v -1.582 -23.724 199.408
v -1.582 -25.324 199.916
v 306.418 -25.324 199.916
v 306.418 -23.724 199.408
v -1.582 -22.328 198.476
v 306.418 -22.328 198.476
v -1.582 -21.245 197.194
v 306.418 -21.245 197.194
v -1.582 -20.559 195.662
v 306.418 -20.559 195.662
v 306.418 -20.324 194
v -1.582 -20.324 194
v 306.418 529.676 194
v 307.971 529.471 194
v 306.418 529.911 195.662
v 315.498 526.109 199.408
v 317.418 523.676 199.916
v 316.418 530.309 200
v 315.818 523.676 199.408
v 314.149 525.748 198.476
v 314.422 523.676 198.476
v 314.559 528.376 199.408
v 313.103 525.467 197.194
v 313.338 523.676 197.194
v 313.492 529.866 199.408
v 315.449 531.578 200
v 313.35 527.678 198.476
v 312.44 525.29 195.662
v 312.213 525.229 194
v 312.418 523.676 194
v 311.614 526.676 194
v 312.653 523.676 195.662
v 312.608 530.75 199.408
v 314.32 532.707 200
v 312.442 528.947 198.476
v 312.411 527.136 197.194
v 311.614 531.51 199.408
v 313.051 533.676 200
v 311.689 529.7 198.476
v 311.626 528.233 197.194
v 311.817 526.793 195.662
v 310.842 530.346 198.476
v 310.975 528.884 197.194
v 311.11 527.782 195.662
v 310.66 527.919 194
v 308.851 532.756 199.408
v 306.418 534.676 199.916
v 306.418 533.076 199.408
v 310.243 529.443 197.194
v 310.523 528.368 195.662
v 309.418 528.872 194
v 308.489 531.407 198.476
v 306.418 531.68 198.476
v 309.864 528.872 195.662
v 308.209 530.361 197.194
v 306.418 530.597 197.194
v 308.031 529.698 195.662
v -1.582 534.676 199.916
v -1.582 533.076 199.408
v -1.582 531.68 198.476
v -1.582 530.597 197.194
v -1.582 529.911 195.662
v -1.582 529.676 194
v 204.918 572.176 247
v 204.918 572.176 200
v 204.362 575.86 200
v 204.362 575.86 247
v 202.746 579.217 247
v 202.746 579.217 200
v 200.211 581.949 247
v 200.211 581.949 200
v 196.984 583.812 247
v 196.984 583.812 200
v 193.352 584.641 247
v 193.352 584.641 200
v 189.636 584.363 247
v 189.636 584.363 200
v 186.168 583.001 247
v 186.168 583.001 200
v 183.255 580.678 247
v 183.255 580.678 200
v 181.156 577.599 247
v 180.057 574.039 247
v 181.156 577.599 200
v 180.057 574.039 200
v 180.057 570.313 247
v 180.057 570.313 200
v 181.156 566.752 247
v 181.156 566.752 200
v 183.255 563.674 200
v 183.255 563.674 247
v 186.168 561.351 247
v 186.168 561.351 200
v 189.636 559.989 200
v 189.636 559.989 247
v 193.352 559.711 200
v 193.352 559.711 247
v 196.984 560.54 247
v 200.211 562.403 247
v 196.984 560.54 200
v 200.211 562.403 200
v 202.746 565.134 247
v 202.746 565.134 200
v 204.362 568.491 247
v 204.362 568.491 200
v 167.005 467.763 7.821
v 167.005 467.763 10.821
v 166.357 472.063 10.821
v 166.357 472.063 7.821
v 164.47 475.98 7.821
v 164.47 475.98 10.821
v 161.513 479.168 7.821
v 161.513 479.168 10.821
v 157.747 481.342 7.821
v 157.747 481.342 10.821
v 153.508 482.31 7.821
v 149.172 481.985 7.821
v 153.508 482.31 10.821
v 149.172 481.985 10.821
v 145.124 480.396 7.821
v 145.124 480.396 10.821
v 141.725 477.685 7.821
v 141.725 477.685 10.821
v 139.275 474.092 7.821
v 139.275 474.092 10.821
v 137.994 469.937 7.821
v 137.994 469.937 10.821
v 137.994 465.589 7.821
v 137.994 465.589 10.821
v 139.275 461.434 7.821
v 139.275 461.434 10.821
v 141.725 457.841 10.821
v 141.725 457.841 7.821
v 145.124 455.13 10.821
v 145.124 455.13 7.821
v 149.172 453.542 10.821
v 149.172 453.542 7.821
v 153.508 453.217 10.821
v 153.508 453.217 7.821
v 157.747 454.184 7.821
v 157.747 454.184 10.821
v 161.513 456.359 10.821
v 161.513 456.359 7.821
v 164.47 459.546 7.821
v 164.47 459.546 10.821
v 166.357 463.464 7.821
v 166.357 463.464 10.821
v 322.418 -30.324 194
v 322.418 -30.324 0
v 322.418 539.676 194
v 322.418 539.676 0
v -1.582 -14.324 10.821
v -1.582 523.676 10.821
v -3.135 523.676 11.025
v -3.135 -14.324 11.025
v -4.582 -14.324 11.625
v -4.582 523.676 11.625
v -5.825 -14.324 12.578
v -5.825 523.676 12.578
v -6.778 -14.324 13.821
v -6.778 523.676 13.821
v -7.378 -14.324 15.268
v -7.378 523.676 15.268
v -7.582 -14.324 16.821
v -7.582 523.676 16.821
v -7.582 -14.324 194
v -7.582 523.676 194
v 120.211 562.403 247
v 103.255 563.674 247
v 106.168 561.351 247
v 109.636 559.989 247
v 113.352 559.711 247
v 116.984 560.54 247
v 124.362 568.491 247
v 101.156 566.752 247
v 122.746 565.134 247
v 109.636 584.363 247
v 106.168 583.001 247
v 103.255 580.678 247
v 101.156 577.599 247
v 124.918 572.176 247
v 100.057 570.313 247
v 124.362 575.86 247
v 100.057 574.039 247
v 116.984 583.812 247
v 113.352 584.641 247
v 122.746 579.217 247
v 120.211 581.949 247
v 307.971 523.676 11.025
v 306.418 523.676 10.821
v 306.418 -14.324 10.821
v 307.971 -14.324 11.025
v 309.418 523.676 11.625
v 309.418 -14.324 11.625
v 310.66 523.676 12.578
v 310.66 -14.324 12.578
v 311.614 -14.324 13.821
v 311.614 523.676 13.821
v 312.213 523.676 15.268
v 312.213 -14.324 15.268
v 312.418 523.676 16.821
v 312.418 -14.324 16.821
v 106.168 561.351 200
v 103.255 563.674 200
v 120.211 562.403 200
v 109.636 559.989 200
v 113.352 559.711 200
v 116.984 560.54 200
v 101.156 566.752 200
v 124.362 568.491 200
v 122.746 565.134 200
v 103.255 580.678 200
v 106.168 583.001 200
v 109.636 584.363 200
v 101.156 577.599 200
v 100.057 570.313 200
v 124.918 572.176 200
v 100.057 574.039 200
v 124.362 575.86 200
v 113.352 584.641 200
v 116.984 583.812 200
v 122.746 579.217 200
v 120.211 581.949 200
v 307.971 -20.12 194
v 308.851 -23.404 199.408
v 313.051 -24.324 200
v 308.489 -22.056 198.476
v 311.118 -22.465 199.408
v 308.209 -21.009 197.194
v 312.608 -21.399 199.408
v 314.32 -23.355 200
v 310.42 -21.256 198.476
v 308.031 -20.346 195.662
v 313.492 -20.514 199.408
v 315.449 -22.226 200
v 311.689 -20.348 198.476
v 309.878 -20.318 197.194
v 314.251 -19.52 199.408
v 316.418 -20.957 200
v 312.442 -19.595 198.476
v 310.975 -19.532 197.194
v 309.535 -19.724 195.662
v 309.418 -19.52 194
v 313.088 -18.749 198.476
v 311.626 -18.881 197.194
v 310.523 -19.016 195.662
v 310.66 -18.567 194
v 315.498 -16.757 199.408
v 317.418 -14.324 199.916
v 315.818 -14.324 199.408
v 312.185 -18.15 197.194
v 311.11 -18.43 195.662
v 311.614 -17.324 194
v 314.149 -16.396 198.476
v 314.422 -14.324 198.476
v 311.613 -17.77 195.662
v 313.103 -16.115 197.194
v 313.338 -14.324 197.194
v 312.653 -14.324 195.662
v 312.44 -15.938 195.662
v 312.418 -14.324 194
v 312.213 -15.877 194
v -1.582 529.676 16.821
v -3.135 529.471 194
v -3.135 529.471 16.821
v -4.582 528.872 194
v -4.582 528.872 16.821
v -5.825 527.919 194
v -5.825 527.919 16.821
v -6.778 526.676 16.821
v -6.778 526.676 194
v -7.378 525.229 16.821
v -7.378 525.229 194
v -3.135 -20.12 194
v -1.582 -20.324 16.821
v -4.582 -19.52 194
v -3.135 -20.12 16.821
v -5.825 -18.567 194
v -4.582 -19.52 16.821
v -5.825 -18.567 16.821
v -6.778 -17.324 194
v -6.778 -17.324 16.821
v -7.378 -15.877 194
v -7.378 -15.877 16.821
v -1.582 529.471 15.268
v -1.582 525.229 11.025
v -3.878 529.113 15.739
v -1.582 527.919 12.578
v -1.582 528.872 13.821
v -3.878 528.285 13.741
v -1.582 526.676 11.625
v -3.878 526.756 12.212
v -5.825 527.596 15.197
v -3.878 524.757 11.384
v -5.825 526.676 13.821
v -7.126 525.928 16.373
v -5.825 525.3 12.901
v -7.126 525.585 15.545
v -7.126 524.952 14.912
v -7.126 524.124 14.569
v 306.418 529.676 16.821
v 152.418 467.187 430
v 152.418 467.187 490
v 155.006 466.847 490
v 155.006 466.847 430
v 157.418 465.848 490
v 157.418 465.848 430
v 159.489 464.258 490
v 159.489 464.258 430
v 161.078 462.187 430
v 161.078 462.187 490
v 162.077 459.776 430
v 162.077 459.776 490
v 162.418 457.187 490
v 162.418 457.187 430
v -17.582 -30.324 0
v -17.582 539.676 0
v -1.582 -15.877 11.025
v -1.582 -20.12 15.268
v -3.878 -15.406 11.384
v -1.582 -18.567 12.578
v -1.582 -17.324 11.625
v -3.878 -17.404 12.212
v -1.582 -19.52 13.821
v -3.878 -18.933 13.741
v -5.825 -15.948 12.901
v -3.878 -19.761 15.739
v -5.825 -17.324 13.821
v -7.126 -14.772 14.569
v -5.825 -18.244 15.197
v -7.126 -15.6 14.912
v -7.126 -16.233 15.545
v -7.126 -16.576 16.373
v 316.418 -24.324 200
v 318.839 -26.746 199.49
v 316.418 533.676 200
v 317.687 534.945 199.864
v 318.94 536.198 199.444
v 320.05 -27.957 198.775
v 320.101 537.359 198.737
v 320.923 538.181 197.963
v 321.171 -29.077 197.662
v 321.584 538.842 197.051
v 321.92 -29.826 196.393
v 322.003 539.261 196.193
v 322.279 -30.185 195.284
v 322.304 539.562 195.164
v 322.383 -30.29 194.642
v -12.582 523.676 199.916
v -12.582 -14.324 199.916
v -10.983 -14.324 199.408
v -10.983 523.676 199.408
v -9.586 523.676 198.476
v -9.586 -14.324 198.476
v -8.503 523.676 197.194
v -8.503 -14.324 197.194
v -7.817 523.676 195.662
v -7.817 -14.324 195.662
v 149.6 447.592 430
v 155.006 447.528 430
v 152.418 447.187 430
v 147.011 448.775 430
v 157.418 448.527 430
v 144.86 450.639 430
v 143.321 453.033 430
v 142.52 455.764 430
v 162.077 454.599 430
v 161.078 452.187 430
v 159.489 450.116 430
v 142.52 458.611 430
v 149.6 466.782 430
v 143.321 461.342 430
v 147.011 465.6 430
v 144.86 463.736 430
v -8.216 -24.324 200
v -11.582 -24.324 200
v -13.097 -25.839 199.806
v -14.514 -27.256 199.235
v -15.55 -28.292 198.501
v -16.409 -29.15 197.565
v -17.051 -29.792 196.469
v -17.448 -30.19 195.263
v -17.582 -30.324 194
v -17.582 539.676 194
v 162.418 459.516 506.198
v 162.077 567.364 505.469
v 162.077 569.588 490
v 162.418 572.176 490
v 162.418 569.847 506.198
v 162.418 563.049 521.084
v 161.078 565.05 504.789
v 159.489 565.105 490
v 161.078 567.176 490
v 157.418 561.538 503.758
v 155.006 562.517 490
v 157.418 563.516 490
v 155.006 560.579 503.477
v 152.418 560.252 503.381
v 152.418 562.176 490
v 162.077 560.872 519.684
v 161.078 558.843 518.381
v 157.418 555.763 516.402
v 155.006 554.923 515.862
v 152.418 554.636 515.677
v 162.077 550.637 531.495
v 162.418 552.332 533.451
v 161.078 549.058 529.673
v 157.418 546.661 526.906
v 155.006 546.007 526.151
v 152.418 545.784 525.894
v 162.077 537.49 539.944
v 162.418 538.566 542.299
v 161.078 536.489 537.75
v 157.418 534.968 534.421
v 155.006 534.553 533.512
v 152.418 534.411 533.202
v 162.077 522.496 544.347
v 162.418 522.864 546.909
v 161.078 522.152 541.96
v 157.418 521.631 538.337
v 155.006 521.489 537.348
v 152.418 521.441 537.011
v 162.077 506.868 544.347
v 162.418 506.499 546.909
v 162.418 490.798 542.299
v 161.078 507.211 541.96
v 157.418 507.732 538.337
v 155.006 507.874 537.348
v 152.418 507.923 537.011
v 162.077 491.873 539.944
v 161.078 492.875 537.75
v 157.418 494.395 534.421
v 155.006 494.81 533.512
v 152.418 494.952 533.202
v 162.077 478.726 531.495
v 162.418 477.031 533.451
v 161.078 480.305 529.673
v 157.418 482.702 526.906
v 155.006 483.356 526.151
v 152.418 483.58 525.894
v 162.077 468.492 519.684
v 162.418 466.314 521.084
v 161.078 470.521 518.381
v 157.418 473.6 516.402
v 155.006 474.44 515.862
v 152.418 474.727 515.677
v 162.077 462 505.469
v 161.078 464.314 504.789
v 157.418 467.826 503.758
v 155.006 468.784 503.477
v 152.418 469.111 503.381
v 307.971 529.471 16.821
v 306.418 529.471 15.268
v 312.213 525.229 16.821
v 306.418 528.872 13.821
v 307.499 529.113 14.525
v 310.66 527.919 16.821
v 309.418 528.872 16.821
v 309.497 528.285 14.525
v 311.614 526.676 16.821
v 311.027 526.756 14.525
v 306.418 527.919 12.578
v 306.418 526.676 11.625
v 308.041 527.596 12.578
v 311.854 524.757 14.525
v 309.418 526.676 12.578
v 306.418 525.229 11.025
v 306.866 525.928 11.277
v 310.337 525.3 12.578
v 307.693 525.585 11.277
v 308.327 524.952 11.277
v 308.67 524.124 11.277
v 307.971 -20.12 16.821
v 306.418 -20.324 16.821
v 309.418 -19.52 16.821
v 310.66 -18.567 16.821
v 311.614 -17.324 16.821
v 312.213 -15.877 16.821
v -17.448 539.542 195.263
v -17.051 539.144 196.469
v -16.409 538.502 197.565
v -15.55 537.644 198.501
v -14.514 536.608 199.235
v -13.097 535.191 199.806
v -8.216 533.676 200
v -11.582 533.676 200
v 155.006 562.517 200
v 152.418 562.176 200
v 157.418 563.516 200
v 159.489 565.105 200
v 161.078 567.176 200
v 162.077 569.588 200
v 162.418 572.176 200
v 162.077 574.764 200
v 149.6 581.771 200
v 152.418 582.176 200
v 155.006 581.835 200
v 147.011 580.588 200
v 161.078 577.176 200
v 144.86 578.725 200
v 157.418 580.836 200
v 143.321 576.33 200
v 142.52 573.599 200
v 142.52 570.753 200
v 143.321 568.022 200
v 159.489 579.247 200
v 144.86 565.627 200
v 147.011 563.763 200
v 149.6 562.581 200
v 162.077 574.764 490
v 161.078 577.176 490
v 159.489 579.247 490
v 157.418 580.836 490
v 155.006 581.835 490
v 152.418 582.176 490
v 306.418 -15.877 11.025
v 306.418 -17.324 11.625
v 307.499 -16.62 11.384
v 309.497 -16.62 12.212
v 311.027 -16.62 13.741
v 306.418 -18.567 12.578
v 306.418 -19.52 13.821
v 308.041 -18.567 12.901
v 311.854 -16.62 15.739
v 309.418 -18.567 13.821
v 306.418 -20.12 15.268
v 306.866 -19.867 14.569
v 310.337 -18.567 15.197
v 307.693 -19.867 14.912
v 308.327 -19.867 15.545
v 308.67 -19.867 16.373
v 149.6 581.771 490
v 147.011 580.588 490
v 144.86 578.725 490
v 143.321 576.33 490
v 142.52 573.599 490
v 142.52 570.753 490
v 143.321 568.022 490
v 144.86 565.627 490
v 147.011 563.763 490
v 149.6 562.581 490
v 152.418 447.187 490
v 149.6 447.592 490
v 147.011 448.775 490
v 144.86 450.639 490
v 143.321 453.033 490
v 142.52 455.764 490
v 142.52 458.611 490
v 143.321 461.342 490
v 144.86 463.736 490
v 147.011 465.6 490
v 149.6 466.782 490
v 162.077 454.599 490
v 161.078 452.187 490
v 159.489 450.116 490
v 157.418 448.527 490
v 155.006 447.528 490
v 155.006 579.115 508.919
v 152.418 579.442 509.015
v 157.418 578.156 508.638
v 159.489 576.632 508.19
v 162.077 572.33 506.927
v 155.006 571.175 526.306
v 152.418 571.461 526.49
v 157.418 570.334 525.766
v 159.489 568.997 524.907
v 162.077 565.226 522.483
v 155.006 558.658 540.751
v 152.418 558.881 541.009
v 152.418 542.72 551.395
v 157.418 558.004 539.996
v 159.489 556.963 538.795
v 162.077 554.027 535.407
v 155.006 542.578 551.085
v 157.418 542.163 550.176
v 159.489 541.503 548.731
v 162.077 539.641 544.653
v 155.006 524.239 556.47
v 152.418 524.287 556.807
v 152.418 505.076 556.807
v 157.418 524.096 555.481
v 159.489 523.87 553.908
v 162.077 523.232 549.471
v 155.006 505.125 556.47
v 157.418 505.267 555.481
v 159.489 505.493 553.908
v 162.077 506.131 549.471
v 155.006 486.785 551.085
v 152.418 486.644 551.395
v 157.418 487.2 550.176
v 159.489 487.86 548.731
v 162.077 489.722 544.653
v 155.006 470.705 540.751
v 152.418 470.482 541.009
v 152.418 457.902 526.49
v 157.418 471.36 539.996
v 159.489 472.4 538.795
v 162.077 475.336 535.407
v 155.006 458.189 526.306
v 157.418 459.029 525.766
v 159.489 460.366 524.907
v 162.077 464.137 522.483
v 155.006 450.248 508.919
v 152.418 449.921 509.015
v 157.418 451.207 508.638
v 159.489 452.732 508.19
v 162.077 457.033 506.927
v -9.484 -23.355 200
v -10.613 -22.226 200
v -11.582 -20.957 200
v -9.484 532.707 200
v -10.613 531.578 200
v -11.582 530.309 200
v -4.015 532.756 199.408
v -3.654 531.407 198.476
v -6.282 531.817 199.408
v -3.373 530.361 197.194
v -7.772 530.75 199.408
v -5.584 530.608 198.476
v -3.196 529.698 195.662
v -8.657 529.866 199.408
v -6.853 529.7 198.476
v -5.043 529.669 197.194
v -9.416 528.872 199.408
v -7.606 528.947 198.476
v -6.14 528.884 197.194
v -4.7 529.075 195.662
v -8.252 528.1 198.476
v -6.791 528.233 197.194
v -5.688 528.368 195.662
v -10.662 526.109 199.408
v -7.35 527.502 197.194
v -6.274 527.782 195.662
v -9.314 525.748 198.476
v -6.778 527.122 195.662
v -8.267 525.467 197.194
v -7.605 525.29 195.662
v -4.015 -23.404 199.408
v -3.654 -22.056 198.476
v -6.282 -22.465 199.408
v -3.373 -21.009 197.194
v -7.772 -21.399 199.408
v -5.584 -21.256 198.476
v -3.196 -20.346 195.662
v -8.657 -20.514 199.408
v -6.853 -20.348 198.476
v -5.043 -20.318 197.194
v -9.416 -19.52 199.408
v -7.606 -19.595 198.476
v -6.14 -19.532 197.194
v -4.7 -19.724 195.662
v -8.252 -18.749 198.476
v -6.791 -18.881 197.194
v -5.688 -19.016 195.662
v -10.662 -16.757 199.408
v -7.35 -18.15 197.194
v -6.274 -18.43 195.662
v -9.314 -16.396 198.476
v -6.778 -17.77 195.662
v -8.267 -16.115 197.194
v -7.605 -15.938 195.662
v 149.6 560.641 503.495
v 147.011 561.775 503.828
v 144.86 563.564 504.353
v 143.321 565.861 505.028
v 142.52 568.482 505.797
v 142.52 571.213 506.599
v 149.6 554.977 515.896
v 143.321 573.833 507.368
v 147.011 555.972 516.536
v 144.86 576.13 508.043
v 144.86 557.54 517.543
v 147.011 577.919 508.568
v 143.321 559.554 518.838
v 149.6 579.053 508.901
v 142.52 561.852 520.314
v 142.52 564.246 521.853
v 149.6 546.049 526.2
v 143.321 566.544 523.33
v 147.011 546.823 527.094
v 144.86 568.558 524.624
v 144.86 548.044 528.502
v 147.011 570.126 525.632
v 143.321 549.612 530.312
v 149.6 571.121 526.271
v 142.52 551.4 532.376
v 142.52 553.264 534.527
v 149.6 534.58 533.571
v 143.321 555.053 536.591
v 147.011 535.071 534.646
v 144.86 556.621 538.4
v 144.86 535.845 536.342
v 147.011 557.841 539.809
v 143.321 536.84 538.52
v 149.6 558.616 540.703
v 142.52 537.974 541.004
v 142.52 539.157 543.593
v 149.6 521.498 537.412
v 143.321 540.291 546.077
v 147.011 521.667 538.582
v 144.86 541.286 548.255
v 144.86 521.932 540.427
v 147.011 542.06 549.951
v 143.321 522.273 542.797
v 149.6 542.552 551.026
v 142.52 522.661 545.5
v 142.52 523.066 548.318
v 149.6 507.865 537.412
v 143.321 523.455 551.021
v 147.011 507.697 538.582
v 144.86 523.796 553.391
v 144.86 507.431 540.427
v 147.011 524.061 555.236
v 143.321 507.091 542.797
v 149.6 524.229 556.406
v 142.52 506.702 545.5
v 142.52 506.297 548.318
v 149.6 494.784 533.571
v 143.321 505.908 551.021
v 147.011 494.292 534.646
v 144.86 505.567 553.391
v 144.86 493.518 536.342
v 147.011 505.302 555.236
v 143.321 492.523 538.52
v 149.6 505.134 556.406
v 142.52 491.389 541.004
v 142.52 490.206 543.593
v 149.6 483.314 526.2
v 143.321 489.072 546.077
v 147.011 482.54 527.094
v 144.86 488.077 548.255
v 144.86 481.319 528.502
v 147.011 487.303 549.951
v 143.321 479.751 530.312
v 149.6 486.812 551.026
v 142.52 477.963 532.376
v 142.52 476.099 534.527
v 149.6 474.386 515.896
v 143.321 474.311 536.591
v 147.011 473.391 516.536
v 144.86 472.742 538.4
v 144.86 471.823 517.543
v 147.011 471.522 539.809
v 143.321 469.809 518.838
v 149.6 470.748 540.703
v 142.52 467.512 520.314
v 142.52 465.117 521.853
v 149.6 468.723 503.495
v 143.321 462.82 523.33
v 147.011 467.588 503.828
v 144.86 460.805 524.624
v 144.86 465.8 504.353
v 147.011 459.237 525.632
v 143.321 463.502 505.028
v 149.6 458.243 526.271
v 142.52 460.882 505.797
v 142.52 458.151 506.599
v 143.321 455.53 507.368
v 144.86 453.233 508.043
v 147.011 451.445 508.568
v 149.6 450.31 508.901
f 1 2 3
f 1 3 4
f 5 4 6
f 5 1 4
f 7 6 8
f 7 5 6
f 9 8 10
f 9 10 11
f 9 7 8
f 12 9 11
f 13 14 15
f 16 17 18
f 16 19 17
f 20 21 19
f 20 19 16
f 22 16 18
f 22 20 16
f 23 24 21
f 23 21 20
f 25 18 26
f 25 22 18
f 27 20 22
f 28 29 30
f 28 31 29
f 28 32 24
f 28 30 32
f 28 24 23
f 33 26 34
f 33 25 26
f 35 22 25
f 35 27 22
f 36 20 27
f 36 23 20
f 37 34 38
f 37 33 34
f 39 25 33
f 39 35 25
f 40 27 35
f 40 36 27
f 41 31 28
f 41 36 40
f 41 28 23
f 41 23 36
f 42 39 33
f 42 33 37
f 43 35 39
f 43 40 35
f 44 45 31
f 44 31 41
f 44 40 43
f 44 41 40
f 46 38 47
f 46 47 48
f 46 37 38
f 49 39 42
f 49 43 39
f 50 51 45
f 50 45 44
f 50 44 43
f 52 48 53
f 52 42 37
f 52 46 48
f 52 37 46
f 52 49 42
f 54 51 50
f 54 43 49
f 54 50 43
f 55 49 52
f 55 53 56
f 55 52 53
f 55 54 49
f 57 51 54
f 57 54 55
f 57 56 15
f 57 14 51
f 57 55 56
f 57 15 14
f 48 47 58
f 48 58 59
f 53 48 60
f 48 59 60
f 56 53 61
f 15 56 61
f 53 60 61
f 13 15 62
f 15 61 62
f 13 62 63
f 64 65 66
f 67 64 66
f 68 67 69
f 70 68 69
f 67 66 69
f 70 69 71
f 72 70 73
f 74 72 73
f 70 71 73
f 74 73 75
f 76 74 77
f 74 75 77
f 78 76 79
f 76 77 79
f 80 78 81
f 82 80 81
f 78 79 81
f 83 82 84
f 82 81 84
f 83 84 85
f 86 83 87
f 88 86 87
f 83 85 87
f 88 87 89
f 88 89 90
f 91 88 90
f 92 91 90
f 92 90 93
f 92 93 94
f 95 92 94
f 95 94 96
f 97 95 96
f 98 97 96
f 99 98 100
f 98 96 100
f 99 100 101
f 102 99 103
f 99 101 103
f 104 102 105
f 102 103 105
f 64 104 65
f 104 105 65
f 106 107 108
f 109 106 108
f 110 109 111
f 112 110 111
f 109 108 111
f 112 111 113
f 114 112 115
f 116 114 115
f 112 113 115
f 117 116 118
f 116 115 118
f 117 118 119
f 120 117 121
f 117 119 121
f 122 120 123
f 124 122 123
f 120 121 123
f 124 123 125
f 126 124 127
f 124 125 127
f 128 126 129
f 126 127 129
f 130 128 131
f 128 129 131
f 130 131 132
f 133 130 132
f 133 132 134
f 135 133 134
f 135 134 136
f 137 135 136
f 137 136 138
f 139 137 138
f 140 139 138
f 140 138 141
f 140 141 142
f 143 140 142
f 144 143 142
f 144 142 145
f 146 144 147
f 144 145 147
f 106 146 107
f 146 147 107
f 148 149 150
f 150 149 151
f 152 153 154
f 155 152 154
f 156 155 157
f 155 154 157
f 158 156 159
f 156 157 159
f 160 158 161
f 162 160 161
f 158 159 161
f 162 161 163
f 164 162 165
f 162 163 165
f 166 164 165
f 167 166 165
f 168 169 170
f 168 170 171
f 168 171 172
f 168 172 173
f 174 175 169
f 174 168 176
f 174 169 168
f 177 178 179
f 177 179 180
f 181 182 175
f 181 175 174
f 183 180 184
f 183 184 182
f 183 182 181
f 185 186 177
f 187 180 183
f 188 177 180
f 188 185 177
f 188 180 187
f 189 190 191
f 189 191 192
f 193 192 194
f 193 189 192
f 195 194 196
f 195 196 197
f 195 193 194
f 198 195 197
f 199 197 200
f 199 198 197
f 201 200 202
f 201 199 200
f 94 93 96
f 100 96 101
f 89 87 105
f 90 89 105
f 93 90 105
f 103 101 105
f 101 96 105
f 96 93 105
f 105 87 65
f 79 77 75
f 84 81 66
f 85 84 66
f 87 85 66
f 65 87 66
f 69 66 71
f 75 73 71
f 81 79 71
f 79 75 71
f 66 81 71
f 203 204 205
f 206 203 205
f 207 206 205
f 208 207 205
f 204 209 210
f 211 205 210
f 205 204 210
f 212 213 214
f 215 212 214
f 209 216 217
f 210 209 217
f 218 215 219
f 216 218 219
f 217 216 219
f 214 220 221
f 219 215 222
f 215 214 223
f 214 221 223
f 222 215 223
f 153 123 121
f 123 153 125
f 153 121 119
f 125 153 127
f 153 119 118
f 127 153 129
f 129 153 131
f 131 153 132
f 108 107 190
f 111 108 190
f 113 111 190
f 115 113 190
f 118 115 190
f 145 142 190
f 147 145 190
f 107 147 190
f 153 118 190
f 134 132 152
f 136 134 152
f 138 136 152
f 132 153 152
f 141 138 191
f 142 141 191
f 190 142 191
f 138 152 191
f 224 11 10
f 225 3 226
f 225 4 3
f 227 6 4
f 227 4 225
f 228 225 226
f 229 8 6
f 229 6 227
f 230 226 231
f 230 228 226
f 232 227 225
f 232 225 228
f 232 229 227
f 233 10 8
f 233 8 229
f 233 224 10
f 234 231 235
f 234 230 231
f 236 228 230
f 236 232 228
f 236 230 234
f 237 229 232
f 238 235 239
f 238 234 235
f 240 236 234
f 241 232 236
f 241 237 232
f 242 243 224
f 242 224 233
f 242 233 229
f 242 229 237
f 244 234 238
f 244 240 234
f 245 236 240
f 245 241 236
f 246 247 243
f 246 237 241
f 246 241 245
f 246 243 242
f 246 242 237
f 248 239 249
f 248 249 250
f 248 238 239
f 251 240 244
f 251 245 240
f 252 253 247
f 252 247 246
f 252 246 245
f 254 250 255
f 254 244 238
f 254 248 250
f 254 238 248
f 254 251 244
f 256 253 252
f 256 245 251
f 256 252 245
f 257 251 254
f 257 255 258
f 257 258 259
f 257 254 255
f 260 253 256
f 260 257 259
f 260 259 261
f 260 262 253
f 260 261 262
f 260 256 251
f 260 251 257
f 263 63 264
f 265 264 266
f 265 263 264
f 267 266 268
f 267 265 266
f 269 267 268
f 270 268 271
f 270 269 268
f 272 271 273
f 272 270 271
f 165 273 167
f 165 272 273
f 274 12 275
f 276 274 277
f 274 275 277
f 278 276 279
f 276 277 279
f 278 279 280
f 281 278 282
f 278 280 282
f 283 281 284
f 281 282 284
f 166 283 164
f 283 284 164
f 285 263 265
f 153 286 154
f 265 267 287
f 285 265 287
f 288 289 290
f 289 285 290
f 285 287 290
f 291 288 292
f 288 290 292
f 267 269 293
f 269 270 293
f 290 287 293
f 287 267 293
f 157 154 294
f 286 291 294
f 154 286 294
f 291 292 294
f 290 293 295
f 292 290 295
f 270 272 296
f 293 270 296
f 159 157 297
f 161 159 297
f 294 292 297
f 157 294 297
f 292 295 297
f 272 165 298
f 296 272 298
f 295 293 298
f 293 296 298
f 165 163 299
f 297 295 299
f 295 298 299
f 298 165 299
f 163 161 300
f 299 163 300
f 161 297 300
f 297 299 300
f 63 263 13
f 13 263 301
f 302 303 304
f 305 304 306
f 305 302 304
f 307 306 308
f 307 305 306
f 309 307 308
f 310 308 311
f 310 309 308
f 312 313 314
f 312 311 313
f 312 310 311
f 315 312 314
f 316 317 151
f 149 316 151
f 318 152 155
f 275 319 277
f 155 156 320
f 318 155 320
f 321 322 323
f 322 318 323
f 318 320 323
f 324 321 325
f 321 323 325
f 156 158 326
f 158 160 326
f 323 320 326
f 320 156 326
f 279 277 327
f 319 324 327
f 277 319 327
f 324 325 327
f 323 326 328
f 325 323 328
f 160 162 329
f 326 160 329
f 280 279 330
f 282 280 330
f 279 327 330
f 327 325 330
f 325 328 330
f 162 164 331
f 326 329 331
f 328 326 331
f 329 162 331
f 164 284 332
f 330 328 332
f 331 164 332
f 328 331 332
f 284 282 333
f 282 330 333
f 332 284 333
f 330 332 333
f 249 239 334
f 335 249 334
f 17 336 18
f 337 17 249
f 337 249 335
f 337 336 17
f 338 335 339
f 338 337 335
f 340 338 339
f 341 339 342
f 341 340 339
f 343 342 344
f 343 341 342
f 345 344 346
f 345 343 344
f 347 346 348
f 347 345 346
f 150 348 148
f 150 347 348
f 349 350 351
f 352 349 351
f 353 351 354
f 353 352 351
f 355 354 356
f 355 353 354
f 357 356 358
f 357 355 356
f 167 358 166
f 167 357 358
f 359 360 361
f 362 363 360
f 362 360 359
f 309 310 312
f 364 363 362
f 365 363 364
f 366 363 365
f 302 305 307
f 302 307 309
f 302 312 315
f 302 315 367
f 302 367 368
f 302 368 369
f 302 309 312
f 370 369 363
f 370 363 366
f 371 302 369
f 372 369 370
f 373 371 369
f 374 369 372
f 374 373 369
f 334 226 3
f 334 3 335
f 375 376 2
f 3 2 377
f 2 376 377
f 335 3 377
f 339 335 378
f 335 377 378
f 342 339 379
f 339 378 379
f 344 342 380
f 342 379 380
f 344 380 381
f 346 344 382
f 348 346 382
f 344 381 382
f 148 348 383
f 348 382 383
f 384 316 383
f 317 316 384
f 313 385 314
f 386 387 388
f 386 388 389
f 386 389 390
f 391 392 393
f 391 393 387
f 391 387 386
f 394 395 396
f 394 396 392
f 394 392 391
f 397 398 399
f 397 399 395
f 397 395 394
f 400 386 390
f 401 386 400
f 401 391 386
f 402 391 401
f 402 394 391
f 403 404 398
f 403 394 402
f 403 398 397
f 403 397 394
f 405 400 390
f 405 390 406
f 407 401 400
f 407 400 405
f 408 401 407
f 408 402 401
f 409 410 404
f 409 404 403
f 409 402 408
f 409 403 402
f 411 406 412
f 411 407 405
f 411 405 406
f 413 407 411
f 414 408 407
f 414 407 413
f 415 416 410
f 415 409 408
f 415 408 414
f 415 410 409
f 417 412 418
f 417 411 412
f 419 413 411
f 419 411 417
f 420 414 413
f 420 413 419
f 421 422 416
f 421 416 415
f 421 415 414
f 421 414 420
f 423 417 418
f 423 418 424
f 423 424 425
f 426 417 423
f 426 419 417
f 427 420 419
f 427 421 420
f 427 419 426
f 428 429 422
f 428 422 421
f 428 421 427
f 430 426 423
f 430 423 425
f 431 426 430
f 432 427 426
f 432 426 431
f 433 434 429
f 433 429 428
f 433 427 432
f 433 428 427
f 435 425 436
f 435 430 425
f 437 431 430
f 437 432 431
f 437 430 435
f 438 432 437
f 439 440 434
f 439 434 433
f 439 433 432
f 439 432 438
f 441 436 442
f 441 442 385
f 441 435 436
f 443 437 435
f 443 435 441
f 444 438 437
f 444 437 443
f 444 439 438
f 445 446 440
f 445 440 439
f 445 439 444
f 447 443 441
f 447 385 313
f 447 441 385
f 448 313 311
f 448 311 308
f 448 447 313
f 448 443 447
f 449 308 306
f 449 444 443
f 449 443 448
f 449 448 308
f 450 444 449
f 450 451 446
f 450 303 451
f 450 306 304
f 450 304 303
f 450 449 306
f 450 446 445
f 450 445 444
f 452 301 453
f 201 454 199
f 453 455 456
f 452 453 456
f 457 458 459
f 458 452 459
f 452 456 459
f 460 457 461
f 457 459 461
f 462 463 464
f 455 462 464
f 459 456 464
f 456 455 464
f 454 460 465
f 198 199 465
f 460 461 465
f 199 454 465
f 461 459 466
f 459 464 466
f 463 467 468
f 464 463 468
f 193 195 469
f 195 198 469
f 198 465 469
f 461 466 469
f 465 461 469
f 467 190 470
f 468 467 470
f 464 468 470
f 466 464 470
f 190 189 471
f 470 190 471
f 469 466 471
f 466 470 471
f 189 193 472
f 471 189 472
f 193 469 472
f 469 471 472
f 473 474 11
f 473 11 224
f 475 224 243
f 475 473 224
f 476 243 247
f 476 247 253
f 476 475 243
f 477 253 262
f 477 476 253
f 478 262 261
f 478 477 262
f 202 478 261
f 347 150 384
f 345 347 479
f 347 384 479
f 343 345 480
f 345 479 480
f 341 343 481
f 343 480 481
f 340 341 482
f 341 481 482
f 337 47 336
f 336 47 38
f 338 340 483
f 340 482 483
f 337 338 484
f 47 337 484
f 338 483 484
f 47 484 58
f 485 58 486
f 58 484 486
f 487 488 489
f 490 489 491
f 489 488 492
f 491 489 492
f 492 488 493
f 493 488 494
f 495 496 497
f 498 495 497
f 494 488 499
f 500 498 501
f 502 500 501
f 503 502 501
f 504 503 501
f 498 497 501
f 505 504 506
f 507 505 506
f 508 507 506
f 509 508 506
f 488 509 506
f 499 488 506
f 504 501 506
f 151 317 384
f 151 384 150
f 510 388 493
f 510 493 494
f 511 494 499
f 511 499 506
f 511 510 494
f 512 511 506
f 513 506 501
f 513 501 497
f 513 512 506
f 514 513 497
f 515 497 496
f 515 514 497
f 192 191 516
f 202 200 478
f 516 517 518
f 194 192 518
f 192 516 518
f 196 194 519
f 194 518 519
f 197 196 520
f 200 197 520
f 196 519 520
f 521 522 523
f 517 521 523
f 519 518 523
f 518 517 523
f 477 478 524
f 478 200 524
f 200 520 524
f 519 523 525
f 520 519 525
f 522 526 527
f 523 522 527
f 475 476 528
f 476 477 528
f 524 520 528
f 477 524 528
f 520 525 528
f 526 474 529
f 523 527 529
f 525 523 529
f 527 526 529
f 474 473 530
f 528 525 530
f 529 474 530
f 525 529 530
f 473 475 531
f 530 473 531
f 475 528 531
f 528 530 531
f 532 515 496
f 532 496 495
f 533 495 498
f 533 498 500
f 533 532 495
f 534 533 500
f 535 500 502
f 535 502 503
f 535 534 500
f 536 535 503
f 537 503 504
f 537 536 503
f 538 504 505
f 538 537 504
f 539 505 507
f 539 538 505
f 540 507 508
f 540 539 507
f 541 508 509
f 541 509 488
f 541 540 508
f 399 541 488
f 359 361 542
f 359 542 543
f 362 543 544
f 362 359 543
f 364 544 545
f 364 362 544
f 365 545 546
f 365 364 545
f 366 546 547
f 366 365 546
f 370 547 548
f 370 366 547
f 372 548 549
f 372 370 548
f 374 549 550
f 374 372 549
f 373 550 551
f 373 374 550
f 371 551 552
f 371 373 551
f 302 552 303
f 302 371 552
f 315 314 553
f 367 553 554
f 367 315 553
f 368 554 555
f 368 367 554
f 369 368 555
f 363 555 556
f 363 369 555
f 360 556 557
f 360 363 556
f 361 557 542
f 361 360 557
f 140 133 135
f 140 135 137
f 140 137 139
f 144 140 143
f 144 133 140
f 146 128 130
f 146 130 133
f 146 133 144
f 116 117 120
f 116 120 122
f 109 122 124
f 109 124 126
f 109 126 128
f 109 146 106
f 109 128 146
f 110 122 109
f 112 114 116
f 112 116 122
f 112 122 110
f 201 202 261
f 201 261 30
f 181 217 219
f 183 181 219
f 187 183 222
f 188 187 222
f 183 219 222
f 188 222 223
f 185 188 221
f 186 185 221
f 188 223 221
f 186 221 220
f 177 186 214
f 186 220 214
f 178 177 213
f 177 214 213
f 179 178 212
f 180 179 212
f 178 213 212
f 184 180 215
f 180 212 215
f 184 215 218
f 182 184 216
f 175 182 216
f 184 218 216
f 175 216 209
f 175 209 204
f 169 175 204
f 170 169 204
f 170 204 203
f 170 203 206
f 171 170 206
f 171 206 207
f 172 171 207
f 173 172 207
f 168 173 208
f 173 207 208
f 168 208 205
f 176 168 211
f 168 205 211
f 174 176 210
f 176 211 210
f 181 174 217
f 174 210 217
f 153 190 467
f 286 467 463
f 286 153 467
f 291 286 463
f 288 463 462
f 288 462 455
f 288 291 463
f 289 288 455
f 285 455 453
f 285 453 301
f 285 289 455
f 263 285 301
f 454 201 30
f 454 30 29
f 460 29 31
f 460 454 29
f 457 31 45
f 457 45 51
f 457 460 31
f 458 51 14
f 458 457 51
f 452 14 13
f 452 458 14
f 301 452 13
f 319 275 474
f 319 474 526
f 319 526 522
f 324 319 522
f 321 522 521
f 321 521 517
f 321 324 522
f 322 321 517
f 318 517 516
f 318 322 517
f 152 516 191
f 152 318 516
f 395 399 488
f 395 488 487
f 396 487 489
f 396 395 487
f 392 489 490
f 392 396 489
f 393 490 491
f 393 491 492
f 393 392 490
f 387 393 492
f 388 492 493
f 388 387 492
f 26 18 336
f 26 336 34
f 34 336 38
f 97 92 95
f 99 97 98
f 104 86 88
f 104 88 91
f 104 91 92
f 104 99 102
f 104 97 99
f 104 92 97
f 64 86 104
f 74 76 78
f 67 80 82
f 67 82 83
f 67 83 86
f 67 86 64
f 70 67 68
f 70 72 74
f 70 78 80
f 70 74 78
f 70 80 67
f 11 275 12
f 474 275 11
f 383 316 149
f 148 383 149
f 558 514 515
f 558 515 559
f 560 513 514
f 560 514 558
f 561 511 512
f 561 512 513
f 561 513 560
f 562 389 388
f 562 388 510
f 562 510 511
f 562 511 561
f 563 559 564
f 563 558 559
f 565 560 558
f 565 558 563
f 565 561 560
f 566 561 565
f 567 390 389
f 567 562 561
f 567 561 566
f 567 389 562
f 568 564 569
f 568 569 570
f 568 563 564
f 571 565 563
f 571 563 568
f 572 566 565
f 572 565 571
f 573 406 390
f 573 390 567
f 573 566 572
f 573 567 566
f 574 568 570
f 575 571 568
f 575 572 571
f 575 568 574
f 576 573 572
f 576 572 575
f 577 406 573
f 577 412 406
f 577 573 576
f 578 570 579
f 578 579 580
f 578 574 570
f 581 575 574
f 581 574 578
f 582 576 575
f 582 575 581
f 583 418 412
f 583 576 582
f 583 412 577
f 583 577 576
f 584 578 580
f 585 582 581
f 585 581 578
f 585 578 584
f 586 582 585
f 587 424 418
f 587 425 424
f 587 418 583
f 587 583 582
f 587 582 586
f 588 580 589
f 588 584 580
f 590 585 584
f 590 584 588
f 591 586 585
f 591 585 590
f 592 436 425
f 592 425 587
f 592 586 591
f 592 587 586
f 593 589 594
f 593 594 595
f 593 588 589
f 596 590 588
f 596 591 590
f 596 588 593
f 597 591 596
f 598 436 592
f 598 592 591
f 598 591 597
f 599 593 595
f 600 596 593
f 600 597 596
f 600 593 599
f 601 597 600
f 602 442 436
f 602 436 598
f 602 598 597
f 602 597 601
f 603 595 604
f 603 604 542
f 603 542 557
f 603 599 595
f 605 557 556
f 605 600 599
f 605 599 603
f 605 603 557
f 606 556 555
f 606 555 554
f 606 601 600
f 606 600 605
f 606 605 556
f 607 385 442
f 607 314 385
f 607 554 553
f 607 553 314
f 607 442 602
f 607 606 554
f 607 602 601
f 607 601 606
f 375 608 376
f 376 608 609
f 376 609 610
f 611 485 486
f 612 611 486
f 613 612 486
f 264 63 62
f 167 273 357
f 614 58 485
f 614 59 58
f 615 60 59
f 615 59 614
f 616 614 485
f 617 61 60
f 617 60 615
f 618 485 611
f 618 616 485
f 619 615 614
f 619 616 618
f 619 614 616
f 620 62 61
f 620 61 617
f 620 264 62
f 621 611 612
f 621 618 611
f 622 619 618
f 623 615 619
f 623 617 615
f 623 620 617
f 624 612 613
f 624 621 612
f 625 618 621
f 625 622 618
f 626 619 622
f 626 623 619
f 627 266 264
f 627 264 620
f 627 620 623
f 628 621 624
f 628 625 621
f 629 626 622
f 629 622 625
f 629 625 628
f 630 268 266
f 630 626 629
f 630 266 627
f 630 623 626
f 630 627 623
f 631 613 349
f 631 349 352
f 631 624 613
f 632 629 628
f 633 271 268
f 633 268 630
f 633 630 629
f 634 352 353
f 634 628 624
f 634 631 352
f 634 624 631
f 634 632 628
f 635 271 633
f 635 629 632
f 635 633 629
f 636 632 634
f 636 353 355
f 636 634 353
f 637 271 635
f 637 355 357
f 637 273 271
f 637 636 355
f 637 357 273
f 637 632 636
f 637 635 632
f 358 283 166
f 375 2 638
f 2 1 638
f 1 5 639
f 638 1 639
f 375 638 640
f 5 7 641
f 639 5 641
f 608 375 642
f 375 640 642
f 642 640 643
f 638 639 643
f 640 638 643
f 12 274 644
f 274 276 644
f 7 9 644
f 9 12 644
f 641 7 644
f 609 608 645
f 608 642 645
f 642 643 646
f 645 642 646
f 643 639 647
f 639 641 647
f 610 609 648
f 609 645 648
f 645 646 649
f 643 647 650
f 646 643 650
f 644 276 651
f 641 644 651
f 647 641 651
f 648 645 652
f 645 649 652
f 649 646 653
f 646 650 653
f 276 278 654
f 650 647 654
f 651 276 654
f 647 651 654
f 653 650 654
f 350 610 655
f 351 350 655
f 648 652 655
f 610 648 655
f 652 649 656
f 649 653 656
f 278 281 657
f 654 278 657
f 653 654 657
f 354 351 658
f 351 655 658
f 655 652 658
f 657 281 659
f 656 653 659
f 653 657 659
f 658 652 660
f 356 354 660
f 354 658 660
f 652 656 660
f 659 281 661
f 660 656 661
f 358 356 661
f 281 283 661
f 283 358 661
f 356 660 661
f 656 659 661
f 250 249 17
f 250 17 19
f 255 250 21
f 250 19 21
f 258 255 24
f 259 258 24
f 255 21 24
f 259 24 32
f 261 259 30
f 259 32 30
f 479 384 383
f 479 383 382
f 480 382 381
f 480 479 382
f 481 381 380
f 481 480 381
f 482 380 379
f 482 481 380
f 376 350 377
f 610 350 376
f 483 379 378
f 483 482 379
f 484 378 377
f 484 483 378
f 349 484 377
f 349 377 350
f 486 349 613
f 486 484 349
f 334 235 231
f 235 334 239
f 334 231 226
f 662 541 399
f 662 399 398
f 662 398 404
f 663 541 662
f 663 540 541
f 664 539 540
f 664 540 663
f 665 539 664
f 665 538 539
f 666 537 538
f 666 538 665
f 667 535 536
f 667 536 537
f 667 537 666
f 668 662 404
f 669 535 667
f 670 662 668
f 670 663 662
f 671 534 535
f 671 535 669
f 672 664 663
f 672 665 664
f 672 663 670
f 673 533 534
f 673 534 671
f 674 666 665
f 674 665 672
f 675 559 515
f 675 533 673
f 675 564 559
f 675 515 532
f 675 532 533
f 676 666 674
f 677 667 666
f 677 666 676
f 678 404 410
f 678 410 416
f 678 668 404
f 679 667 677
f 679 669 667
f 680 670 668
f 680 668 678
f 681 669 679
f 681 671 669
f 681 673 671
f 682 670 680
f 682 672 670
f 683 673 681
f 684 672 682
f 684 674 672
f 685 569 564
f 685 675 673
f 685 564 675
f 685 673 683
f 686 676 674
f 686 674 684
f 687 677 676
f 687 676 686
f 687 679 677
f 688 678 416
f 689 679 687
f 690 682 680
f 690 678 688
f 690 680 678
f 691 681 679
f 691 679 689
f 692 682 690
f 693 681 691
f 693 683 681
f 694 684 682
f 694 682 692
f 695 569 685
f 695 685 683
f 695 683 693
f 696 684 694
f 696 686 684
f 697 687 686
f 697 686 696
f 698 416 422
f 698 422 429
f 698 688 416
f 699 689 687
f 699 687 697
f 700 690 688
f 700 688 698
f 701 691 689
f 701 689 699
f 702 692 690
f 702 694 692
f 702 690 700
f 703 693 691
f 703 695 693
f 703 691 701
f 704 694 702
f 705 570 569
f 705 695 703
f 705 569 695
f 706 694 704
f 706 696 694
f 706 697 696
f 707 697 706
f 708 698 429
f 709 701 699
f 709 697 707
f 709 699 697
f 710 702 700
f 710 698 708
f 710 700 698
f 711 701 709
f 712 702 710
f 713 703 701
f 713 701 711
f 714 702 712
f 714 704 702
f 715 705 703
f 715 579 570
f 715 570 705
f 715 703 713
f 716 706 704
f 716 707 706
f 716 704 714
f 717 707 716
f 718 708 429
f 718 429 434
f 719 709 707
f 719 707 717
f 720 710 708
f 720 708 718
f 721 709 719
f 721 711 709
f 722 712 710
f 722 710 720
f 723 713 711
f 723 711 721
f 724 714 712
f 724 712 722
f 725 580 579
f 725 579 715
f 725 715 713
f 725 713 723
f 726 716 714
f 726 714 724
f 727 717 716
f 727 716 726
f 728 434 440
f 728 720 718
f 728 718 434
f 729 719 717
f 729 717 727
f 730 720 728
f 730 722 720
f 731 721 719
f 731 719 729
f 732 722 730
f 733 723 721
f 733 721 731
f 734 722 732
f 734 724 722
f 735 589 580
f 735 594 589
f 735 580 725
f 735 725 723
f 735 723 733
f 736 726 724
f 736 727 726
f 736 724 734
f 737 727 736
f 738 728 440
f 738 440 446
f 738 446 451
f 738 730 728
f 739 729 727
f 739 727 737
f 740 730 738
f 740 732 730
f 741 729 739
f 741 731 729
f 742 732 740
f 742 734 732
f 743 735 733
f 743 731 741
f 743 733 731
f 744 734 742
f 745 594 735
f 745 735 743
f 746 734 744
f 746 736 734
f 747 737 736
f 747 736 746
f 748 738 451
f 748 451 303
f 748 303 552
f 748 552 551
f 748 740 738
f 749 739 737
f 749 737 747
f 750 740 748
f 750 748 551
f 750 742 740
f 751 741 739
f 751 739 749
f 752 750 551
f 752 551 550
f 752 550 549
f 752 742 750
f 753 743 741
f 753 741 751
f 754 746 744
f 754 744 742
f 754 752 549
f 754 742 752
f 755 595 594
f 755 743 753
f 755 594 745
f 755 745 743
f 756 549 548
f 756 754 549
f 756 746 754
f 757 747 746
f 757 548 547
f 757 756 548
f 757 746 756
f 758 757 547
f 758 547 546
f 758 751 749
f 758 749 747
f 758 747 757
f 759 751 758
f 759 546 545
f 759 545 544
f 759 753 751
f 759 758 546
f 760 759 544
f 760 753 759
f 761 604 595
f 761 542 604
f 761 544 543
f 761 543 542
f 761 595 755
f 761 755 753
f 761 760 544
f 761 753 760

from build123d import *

# Parameters (mm, degrees)
F0_W         = 340
F0_H         = 570
F0_W_2       = 320
F0_H_2       = 550
F1_DEPTH     = 200
F2_W         = 340
F2_H         = 10.8207641169
F3_DEPTH     = 570
F4_T1_DEPTH  = 538
F4_T3_DEPTH  = 308
F4_T5_DEPTH  = 183.1792358831
F4_S9_W      = 6
F4_S9_H      = 6
F4_T10_DEPTH = 6
F4_S15_W     = 6
F4_S15_H     = 6
F4_T16_DEPTH = 6
F4_S21_W     = 6
F4_S21_H     = 6
F4_T22_DEPTH = 6
F4_S27_W     = 6
F4_S27_H     = 6
F4_T28_DEPTH = 6
F4_T31_DEPTH = 600
F4_T33_DEPTH = 370
F4_T35_DEPTH = 538
F4_T37_DEPTH = 308
F4_T40_ANGLE = 90
F4_T42_ANGLE = 90
F4_T44_ANGLE = 90
F4_T46_ANGLE = 90
F5_R         = 14.5871340725
F6_DEPTH     = 3
F12_R        = 12.5
F13_DEPTH    = 47


# Not quite as in the source:
# - a fillet or chamfer that OpenCascade refuses, or shapes differently, is made with other operations: its cross-section is extruded or revolved along the edge and cut away or added


with BuildPart() as f1:
    # F0 (on Top) → F1 (new body)
    with BuildSketch(Plane.XY):
        with Locations((152.4177306145, 254.675924629)):
            Rectangle(F0_W, F0_H)
        with Locations((152.4177306145, 254.675924629)):
            Rectangle(F0_W_2, F0_H_2, mode=Mode.SUBTRACT)
    extrude(amount=F1_DEPTH)

    # F2 (on face) → F3 (join, through all)
    with BuildSketch(Plane.XZ.offset(30.324075371)):
        with Locations((152.4177306145, 5.4103820585)):
            Rectangle(F2_W, F2_H)
    extrude(amount=-F3_DEPTH)

    # F4: fillet of radius 6 on 16 edges, made by hand

    # F4_s2 → F4_t1 (join)
    with BuildSketch(Plane.XZ.offset(-523.675924629)):
        with BuildLine():
            ThreePointArc((-1.5822693855, 10.8207641169), (-5.8249100726, 12.5781234298), (-7.5822693855, 16.8207641169))
            Line((-7.5822693855, 16.8207641169), (-7.5822693855, 10.8207641169))
            Line((-7.5822693855, 10.8207641169), (-1.5822693855, 10.8207641169))
        make_face()
        with BuildLine():
            ThreePointArc((306.4177306145, 10.8207641169), (310.6603713017, 12.5781234298), (312.4177306145, 16.8207641169))
            Line((312.4177306145, 16.8207641169), (312.4177306145, 10.8207641169))
            Line((312.4177306145, 10.8207641169), (306.4177306145, 10.8207641169))
        make_face()
    extrude(amount=F4_T1_DEPTH)

    # F4_s4 → F4_t3 (join)
    with BuildSketch(Plane.YZ.offset(-1.5822693855)):
        with BuildLine():
            ThreePointArc((523.675924629, 10.8207641169), (527.9185653161, 12.5781234298), (529.675924629, 16.8207641169))
            Line((529.675924629, 16.8207641169), (529.675924629, 10.8207641169))
            Line((529.675924629, 10.8207641169), (523.675924629, 10.8207641169))
        make_face()
        with BuildLine():
            ThreePointArc((-20.324075371, 16.8207641169), (-18.5667160581, 12.5781234298), (-14.324075371, 10.8207641169))
            Line((-14.324075371, 10.8207641169), (-20.324075371, 10.8207641169))
            Line((-20.324075371, 10.8207641169), (-20.324075371, 16.8207641169))
        make_face()
    extrude(amount=F4_T3_DEPTH)

    # F4_s6 → F4_t5 (join)
    with BuildSketch(Plane.XY.offset(16.8207641169)):
        with BuildLine():
            ThreePointArc((312.4177306145, 523.675924629), (310.6603713017, 527.9185653161), (306.4177306145, 529.675924629))
            Line((306.4177306145, 529.675924629), (312.4177306145, 529.675924629))
            Line((312.4177306145, 529.675924629), (312.4177306145, 523.675924629))
        make_face()
        with BuildLine():
            ThreePointArc((-1.5822693855, 529.675924629), (-5.8249100726, 527.9185653161), (-7.5822693855, 523.675924629))
            Line((-7.5822693855, 523.675924629), (-7.5822693855, 529.675924629))
            Line((-7.5822693855, 529.675924629), (-1.5822693855, 529.675924629))
        make_face()
        with BuildLine():
            ThreePointArc((-1.5822693855, -20.324075371), (-5.8249100726, -18.5667160581), (-7.5822693855, -14.324075371))
            Line((-7.5822693855, -14.324075371), (-7.5822693855, -20.324075371))
            Line((-7.5822693855, -20.324075371), (-1.5822693855, -20.324075371))
        make_face()
        with BuildLine():
            ThreePointArc((306.4177306145, -20.324075371), (310.6603713017, -18.5667160581), (312.4177306145, -14.324075371))
            Line((312.4177306145, -14.324075371), (312.4177306145, -20.324075371))
            Line((312.4177306145, -20.324075371), (306.4177306145, -20.324075371))
        make_face()
    extrude(amount=F4_T5_DEPTH)


with BuildPart() as f4_tool8:
    # F4_s9 → F4_t10 (new body)
    with BuildSketch(Plane.YZ.offset(-1.5822693855)):
        with Locations((-17.324075371, 13.8207641169)):
            Rectangle(F4_S9_W, F4_S9_H)
    extrude(amount=-F4_T10_DEPTH)

    # F4_s11 → F4_t12 (revolve, cut)
    with BuildSketch(Plane(origin=(-1.5822693855, -14.324075371, 16.8207641169), x_dir=(0, 0.7071067812, 0.7071067812), z_dir=(0, -0.7071067812, 0.7071067812))):
        with BuildLine():
            ThreePointArc((0, -6), (6, 0), (0, 6))
            Line((0, 6), (0, -6))
        make_face()
    revolve(axis=Axis((-1.5822693855, -14.324075371, 16.8207641169), (-1, 0, 0)), mode=Mode.SUBTRACT)


with BuildPart() as f1_1:
    add(f1.part)

    # F4_t7: union F4_tool8
    add(f4_tool8.part)


with BuildPart() as f4_tool14:
    # F4_s15 → F4_t16 (new body)
    with BuildSketch(Plane.YZ.offset(-1.5822693855)):
        with Locations((526.675924629, 13.8207641169)):
            Rectangle(F4_S15_W, F4_S15_H)
    extrude(amount=-F4_T16_DEPTH)

    # F4_s17 → F4_t18 (revolve, cut)
    with BuildSketch(Plane(origin=(-1.5822693855, 523.675924629, 16.8207641169), x_dir=(0, -0.7071067812, 0.7071067812), z_dir=(0, -0.7071067812, -0.7071067812))):
        with BuildLine():
            ThreePointArc((0, -6), (6, 0), (0, 6))
            Line((0, 6), (0, -6))
        make_face()
    revolve(axis=Axis((-1.5822693855, 523.675924629, 16.8207641169), (-1, 0, 0)), mode=Mode.SUBTRACT)


with BuildPart() as f1_2:
    add(f1_1.part)

    # F4_t13: union F4_tool14
    add(f4_tool14.part)


with BuildPart() as f4_tool20:
    # F4_s21 → F4_t22 (new body)
    with BuildSketch(Plane.XY.offset(16.8207641169)):
        with Locations((309.4177306145, 526.675924629)):
            Rectangle(F4_S21_W, F4_S21_H)
    extrude(amount=-F4_T22_DEPTH)

    # F4_s23 → F4_t24 (revolve, cut)
    with BuildSketch(Plane(origin=(306.4177306145, 523.675924629, 16.8207641169), x_dir=(-0.7071067812, -0.7071067812, 0), z_dir=(0.7071067812, -0.7071067812, 0))):
        with BuildLine():
            ThreePointArc((0, -6), (6, 0), (0, 6))
            Line((0, 6), (0, -6))
        make_face()
    revolve(axis=Axis((306.4177306145, 523.675924629, 16.8207641169), (0, 0, -1)), mode=Mode.SUBTRACT)


with BuildPart() as f1_3:
    add(f1_2.part)

    # F4_t19: union F4_tool20
    add(f4_tool20.part)


with BuildPart() as f4_tool26:
    # F4_s27 → F4_t28 (new body)
    with BuildSketch(Plane.XZ.offset(14.324075371)):
        with Locations((309.4177306145, 13.8207641169)):
            Rectangle(F4_S27_W, F4_S27_H)
    extrude(amount=F4_T28_DEPTH)

    # F4_s29 → F4_t30 (revolve, cut)
    with BuildSketch(Plane(origin=(306.4177306145, -14.324075371, 16.8207641169), x_dir=(-0.7071067812, 0, 0.7071067812), z_dir=(0.7071067812, 0, 0.7071067812))):
        with BuildLine():
            ThreePointArc((0, -6), (6, 0), (0, 6))
            Line((0, 6), (0, -6))
        make_face()
    revolve(axis=Axis((306.4177306145, -14.324075371, 16.8207641169), (0, -1, 0)), mode=Mode.SUBTRACT)


with BuildPart() as f1_4:
    add(f1_3.part)

    # F4_t25: union F4_tool26
    add(f4_tool26.part)

    # F4_s32 → F4_t31 (cut)
    with BuildSketch(Plane.XZ.offset(-554.675924629)):
        with BuildLine():
            ThreePointArc((-17.5822693855, 194), (-15.8249100726, 198.2426406871), (-11.5822693855, 200))
            Line((-11.5822693855, 200), (-17.5822693855, 200))
            Line((-17.5822693855, 200), (-17.5822693855, 194))
        make_face()
        with BuildLine():
            ThreePointArc((316.4177306145, 200), (320.6603713017, 198.2426406871), (322.4177306145, 194))
            Line((322.4177306145, 194), (322.4177306145, 200))
            Line((322.4177306145, 200), (316.4177306145, 200))
        make_face()
    extrude(amount=F4_T31_DEPTH, mode=Mode.SUBTRACT)

    # F4_s34 → F4_t33 (cut)
    with BuildSketch(Plane.YZ.offset(-32.5822693855)):
        with BuildLine():
            ThreePointArc((-24.324075371, 200), (-28.5667160581, 198.2426406871), (-30.324075371, 194))
            Line((-30.324075371, 194), (-30.324075371, 200))
            Line((-30.324075371, 200), (-24.324075371, 200))
        make_face()
        with BuildLine():
            ThreePointArc((539.675924629, 194), (537.9185653161, 198.2426406871), (533.675924629, 200))
            Line((533.675924629, 200), (539.675924629, 200))
            Line((539.675924629, 200), (539.675924629, 194))
        make_face()
    extrude(amount=F4_T33_DEPTH, mode=Mode.SUBTRACT)

    # F4_s36 → F4_t35 (cut)
    with BuildSketch(Plane.XZ.offset(-523.675924629)):
        with BuildLine():
            ThreePointArc((-13.5822693855, 200), (-9.3396286983, 198.2426406871), (-7.5822693855, 194))
            Line((-7.5822693855, 194), (-7.5822693855, 200))
            Line((-7.5822693855, 200), (-13.5822693855, 200))
        make_face()
        with BuildLine():
            ThreePointArc((318.4177306145, 200), (314.1750899274, 198.2426406871), (312.4177306145, 194))
            Line((312.4177306145, 194), (312.4177306145, 200))
            Line((312.4177306145, 200), (318.4177306145, 200))
        make_face()
    extrude(amount=F4_T35_DEPTH, mode=Mode.SUBTRACT)

    # F4_s38 → F4_t37 (cut)
    with BuildSketch(Plane.YZ.offset(-1.5822693855)):
        with BuildLine():
            ThreePointArc((535.675924629, 200), (531.4332839419, 198.2426406871), (529.675924629, 194))
            Line((529.675924629, 194), (529.675924629, 200))
            Line((529.675924629, 200), (535.675924629, 200))
        make_face()
        with BuildLine():
            ThreePointArc((-26.324075371, 200), (-22.0814346839, 198.2426406871), (-20.324075371, 194))
            Line((-20.324075371, 194), (-20.324075371, 200))
            Line((-20.324075371, 200), (-26.324075371, 200))
        make_face()
    extrude(amount=F4_T37_DEPTH, mode=Mode.SUBTRACT)

    # F4_s39 → F4_t40 (revolve, cut)
    with BuildSketch(Plane.YZ.offset(306.4177306145)):
        with BuildLine():
            ThreePointArc((-26.324075371, 200), (-22.0814346839, 198.2426406871), (-20.324075371, 194))
            Line((-20.324075371, 194), (-20.324075371, 200))
            Line((-20.324075371, 200), (-26.324075371, 200))
        make_face()
    revolve(axis=Axis((306.4177306145, -14.324075371, 200), (0, 0, 1)), revolution_arc=F4_T40_ANGLE, mode=Mode.SUBTRACT)

    # F4_s41 → F4_t42 (revolve, cut)
    with BuildSketch(Plane.YZ.offset(-1.5822693855)):
        with BuildLine():
            ThreePointArc((-26.324075371, 200), (-22.0814346839, 198.2426406871), (-20.324075371, 194))
            Line((-20.324075371, 194), (-20.324075371, 200))
            Line((-20.324075371, 200), (-26.324075371, 200))
        make_face()
    revolve(axis=Axis((-1.5822693855, -14.324075371, 200), (0, 0, -1)), revolution_arc=F4_T42_ANGLE, mode=Mode.SUBTRACT)

    # F4_s43 → F4_t44 (revolve, cut)
    with BuildSketch(Plane.XZ.offset(-523.675924629)):
        with BuildLine():
            ThreePointArc((318.4177306145, 200), (314.1750899274, 198.2426406871), (312.4177306145, 194))
            Line((312.4177306145, 194), (312.4177306145, 200))
            Line((312.4177306145, 200), (318.4177306145, 200))
        make_face()
    revolve(axis=Axis((306.4177306145, 523.675924629, 200), (0, 0, 1)), revolution_arc=F4_T44_ANGLE, mode=Mode.SUBTRACT)

    # F4_s45 → F4_t46 (revolve, cut)
    with BuildSketch(Plane.YZ.offset(-1.5822693855)):
        with BuildLine():
            ThreePointArc((535.675924629, 200), (531.4332839419, 198.2426406871), (529.675924629, 194))
            Line((529.675924629, 194), (529.675924629, 200))
            Line((529.675924629, 200), (535.675924629, 200))
        make_face()
    revolve(axis=Axis((-1.5822693855, 523.675924629, 200), (0, 0, 1)), revolution_arc=F4_T46_ANGLE, mode=Mode.SUBTRACT)

    # F5 (on face) → F6 (cut)
    with BuildSketch(Plane.XY.offset(10.8207641169)):
        with Locations((152.4177306145, 467.7632451057)):
            Circle(F5_R)
    extrude(amount=-F6_DEPTH, mode=Mode.SUBTRACT)


with BuildPart() as f11:
    # F11: sweep along a path in F10
    with BuildLine(Plane.YZ.offset(152.4177306145)) as f11_path:
        Line((572.175924629, 200), (572.175924629, 430))
        Line((572.175924629, 430), (572.175924629, 490))
        ThreePointArc((572.175924629, 490), (514.681654498, 547.494270131), (457.187384367, 490))
        Line((457.187384367, 490), (457.187384367, 430))
    # F8 (on offset) → F11 (sweep)
    with BuildSketch(Plane.XY.offset(200)):
        with BuildLine():
            ThreePointArc((152.4177306145, 582.175924629), (142.4177306145, 572.175924629), (152.4177306145, 562.175924629))
            Line((152.4177306145, 562.175924629), (152.4177306145, 582.175924629))
        make_face()
        with BuildLine():
            Line((152.4177306145, 582.175924629), (152.4177306145, 562.175924629))
            ThreePointArc((152.4177306145, 562.175924629), (159.4887984264, 565.1048568171), (162.4177306145, 572.175924629))
            ThreePointArc((162.4177306145, 572.175924629), (159.4887984264, 579.2469924408), (152.4177306145, 582.175924629))
        make_face()
    sweep(path=f11_path.line)


with BuildPart() as f13:
    # F12 (on offset) → F13 (new body)
    with BuildSketch(Plane.XY.offset(200)):
        with Locations((112.4177306145, 572.175924629)):
            Circle(F12_R)
    extrude(amount=F13_DEPTH)


with BuildPart() as f13b:
    # F12 (on offset) → F13, piece 2 (new body)
    with BuildSketch(Plane.XY.offset(200)):
        with Locations((192.4177306145, 572.175924629)):
            Circle(F12_R)
    extrude(amount=F13_DEPTH)


solid = Compound([f1_4.part, f11.part, f13.part, f13b.part])
